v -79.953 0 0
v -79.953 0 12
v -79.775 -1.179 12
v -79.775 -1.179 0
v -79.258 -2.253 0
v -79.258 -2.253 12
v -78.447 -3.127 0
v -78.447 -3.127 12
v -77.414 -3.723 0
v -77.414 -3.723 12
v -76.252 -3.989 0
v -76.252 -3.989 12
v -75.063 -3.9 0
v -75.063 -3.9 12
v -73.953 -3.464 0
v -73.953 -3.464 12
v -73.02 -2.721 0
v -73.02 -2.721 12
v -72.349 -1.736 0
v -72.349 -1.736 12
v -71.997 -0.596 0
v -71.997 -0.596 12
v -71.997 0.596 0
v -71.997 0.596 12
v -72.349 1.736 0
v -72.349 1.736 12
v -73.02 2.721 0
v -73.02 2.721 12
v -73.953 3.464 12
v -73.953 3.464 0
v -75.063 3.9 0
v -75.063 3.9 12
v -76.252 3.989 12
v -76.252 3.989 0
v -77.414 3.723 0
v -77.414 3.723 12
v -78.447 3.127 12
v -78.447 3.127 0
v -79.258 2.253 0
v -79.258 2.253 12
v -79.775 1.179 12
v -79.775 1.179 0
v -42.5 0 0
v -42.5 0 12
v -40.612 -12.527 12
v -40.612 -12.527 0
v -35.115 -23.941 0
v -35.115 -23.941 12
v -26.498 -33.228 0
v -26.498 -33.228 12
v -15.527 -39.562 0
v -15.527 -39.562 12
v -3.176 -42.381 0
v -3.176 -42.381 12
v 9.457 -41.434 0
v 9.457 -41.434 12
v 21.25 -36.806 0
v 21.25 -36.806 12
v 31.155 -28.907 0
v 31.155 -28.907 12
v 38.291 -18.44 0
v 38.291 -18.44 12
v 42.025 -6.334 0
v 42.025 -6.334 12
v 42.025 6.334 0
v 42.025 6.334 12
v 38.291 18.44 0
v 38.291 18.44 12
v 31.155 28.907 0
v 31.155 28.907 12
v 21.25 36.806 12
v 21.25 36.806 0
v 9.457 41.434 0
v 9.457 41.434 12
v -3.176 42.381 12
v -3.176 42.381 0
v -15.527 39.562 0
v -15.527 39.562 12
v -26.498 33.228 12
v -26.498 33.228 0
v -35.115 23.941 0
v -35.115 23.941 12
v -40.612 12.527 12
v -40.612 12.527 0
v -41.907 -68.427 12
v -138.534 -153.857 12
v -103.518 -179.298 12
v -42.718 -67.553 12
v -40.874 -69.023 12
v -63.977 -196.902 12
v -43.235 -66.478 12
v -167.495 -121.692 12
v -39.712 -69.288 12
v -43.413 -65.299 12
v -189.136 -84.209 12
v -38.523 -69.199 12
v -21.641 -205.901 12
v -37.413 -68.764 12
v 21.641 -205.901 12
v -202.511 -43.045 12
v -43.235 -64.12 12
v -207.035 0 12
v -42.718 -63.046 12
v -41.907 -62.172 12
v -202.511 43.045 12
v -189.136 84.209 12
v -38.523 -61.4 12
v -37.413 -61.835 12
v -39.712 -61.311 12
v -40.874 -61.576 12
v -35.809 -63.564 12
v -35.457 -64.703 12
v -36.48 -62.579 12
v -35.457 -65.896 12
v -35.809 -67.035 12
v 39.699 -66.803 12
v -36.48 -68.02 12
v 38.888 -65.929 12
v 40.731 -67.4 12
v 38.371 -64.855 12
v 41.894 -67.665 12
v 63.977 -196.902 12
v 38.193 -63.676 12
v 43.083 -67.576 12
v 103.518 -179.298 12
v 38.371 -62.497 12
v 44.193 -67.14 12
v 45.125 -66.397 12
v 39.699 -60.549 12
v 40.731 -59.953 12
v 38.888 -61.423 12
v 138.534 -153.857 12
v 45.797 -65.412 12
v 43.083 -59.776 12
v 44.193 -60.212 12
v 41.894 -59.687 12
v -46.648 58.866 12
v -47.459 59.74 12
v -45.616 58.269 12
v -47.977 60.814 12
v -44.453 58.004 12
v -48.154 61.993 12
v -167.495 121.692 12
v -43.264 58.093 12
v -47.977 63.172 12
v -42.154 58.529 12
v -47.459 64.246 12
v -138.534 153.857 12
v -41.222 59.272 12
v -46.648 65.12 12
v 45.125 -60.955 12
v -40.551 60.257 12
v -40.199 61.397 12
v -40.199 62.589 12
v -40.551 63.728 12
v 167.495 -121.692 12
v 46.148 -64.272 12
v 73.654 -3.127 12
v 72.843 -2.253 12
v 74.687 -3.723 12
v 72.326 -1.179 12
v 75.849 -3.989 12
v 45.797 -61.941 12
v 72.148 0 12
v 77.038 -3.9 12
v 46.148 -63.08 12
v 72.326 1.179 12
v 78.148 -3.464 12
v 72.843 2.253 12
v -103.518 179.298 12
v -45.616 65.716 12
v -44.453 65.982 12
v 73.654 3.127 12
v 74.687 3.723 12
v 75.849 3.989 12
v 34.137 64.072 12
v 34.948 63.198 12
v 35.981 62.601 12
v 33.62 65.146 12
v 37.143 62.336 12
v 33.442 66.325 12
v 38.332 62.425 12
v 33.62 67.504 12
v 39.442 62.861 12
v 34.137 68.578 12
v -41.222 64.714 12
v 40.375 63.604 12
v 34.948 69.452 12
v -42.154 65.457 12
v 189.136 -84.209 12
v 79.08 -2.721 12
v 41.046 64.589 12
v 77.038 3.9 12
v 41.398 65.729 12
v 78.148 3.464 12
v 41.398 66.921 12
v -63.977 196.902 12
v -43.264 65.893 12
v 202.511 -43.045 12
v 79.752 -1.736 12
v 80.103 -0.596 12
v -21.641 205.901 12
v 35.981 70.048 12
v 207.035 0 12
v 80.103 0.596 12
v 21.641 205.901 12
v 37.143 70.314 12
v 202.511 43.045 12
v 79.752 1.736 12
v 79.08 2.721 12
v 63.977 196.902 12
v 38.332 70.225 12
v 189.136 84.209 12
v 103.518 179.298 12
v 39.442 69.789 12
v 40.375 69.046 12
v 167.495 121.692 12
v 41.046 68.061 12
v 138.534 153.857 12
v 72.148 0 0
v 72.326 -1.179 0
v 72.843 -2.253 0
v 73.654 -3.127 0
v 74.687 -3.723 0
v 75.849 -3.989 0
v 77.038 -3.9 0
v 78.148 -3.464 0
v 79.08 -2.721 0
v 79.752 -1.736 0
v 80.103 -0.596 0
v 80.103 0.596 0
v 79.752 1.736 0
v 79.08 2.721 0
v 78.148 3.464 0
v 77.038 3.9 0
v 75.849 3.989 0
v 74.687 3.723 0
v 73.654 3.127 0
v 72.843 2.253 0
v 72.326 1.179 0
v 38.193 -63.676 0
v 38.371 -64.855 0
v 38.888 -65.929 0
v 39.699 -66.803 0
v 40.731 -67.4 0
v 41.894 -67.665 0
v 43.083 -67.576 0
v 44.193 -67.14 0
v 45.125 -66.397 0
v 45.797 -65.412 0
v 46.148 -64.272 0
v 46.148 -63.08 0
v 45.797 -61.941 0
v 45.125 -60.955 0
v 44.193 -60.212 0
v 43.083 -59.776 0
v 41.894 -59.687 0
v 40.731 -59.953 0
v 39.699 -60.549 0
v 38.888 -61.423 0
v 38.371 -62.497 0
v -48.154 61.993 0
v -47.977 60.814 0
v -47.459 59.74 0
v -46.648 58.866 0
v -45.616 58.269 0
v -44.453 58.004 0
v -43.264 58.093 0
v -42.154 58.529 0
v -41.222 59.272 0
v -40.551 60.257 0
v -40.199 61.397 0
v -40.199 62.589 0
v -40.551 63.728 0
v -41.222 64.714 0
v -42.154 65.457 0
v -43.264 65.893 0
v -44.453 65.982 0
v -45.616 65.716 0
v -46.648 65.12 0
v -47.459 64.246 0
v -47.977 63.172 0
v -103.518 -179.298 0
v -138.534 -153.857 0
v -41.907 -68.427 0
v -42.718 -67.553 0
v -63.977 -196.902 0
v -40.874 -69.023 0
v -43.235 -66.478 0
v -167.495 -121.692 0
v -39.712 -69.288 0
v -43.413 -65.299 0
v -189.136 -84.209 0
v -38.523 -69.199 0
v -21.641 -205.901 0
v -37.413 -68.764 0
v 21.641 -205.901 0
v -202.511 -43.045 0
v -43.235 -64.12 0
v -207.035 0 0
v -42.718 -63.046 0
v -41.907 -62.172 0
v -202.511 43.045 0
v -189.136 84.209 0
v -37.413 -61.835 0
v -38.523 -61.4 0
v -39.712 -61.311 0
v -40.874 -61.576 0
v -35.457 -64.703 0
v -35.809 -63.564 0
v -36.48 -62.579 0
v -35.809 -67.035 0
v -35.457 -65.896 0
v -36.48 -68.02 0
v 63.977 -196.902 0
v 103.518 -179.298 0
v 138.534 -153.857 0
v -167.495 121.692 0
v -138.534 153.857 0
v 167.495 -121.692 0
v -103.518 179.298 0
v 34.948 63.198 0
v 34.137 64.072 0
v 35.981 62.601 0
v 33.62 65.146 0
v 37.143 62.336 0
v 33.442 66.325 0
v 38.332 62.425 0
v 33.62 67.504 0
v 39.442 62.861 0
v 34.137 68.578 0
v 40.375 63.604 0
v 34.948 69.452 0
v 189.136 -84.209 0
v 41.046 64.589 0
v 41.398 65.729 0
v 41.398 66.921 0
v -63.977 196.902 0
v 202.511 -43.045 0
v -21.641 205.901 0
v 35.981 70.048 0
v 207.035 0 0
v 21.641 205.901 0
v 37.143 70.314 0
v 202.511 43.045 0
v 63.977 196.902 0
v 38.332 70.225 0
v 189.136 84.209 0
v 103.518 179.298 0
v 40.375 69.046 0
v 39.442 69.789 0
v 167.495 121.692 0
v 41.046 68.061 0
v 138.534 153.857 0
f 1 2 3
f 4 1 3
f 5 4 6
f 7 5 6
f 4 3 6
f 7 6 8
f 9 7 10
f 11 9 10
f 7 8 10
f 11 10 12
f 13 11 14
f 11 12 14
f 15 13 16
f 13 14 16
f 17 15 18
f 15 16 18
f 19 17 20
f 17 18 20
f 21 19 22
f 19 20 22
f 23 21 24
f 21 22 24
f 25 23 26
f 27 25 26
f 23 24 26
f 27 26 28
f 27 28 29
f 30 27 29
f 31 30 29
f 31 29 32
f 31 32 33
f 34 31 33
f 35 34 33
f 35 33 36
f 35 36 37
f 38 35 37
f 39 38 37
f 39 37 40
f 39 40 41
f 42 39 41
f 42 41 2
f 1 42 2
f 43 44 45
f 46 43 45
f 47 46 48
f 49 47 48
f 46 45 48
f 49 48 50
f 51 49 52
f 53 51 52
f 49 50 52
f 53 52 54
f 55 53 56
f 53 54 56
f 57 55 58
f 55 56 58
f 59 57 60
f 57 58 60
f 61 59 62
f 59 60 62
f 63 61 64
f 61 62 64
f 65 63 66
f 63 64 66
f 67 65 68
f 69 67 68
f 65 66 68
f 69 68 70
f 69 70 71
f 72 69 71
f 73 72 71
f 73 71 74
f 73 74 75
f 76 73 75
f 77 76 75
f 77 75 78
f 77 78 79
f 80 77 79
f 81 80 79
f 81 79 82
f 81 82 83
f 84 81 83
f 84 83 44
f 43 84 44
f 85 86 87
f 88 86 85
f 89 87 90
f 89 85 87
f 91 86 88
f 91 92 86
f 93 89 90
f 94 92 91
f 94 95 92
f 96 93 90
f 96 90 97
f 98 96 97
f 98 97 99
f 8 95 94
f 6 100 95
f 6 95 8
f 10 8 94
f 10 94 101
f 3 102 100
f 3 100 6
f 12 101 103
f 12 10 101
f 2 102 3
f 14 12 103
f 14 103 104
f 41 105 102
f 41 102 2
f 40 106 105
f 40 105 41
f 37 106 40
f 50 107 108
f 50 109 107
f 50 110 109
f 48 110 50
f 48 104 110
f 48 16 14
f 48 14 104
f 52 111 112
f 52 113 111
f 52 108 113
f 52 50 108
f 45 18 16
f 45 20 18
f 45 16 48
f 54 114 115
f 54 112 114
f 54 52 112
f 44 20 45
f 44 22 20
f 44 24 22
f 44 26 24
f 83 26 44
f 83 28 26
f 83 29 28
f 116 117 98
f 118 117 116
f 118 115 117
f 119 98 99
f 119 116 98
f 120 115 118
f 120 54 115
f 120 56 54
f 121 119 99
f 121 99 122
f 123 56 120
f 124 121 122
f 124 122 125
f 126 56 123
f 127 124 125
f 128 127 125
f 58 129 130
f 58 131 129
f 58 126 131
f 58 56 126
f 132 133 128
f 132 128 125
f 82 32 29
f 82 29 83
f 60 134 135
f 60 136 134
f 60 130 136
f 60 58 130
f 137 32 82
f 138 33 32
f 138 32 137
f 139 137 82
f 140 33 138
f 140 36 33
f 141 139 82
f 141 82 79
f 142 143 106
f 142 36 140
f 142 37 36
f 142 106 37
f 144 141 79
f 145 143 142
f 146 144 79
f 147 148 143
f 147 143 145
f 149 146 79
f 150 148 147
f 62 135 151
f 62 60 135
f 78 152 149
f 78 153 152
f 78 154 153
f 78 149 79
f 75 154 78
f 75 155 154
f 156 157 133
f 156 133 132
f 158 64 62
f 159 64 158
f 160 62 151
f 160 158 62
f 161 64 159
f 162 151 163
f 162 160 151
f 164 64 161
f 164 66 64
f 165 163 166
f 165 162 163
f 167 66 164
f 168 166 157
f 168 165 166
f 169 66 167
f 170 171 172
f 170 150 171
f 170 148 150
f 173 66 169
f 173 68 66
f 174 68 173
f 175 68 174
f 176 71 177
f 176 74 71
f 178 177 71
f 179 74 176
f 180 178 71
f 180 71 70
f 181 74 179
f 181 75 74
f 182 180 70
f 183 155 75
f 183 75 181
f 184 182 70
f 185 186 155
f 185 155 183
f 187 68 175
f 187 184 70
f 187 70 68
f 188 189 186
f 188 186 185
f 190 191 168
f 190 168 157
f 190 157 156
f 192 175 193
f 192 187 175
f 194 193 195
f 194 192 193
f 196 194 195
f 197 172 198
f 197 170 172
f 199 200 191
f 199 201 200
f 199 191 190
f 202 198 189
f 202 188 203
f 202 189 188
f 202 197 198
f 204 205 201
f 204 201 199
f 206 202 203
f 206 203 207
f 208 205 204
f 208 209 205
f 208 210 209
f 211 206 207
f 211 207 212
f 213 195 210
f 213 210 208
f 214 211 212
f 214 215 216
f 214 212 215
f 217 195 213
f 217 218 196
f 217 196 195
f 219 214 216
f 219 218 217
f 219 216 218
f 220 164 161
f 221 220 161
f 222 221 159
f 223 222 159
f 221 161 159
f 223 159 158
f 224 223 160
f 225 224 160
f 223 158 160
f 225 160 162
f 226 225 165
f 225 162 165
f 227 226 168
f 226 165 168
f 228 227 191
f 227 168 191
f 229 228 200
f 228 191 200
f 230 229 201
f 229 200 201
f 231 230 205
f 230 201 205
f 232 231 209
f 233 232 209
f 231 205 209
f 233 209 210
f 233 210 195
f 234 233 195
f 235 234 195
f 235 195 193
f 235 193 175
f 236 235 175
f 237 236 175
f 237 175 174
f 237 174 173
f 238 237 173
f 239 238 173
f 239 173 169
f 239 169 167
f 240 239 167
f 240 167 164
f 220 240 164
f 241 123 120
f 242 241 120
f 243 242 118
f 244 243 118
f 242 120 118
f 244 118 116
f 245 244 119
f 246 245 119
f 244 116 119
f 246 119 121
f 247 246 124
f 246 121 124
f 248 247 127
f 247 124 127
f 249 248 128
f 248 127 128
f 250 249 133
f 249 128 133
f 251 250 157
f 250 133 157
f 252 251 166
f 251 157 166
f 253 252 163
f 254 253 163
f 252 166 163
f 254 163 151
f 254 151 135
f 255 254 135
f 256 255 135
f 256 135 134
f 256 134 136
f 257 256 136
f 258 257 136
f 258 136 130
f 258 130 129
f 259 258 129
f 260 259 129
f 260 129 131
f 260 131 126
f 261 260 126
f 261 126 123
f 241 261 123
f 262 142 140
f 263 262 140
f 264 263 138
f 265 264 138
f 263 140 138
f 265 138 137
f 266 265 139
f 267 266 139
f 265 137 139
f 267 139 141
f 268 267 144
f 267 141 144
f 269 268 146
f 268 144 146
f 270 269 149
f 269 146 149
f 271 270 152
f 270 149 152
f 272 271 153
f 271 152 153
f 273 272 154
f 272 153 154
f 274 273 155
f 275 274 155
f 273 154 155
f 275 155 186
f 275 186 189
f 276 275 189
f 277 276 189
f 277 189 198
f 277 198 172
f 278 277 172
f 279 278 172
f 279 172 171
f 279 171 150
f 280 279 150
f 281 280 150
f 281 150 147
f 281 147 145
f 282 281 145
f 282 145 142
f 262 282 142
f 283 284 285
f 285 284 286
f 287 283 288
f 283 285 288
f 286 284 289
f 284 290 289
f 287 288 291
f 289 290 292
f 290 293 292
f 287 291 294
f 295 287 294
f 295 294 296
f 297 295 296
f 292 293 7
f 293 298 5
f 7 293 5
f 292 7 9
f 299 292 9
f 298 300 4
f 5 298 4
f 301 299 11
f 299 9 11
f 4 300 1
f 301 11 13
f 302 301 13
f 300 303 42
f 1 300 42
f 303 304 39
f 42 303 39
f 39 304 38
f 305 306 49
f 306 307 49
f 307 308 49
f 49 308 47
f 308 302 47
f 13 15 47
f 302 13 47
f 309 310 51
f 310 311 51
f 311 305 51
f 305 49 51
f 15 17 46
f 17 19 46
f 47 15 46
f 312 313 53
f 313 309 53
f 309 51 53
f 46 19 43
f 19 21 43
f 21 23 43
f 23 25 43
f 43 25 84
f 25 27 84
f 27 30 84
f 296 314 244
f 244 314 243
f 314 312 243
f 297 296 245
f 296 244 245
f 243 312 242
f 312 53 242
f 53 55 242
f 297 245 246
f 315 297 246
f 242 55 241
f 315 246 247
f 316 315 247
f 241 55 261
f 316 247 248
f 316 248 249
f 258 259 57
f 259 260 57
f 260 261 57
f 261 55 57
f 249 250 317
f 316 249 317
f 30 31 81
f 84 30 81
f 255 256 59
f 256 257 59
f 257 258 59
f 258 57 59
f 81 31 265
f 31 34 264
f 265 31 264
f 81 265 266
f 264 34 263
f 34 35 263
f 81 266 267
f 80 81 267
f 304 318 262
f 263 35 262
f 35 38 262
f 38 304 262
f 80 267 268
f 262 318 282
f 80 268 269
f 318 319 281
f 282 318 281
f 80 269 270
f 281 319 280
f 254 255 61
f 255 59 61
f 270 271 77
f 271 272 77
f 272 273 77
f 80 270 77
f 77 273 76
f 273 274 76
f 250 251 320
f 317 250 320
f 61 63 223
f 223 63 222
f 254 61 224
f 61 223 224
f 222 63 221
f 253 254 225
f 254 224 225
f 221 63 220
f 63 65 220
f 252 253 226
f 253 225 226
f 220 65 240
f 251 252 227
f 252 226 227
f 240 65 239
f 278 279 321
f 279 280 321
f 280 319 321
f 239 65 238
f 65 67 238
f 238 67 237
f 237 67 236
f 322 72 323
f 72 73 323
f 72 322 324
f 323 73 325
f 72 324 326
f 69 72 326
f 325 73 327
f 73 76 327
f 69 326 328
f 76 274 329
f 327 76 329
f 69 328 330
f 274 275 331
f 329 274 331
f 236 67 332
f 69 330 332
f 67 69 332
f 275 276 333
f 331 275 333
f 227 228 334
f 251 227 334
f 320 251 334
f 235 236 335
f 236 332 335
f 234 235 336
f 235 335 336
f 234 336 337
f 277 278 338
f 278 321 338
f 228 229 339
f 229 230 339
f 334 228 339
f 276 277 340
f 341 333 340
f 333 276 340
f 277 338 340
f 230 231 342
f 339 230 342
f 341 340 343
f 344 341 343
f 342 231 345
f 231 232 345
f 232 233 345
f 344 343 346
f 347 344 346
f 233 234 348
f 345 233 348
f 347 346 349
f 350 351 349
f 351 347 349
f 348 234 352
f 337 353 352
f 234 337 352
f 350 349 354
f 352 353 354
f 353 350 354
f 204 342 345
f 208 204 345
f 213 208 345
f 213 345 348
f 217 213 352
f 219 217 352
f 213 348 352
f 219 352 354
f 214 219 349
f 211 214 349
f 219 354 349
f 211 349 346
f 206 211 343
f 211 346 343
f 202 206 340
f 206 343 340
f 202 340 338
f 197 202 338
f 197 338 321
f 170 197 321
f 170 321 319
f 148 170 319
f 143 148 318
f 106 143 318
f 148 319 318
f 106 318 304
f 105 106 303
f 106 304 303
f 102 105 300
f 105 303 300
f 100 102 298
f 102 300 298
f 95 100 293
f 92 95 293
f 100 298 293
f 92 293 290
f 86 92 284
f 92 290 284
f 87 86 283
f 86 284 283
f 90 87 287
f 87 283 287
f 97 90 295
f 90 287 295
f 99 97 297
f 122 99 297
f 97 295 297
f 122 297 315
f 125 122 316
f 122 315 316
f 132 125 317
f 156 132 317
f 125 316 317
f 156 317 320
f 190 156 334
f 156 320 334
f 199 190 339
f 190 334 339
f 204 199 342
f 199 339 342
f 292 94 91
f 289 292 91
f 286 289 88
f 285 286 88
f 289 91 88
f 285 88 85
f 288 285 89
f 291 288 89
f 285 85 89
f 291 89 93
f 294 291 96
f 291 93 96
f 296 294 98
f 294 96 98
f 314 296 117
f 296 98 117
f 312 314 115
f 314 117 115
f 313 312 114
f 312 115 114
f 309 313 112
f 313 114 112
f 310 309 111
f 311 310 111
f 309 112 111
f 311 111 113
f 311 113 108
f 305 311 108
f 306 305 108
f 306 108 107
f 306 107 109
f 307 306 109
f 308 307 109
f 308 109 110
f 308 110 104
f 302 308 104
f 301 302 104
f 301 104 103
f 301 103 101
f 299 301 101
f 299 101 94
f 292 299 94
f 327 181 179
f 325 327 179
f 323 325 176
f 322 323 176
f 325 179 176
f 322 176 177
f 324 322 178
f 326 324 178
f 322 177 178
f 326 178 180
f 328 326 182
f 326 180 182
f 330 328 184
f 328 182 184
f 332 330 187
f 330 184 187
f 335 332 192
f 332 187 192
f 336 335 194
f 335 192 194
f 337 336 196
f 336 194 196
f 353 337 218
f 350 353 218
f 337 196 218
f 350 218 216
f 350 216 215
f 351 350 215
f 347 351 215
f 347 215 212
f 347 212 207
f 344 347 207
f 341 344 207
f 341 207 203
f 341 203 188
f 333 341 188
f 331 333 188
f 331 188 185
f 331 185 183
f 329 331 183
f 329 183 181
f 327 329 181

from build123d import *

# Parameters (mm, degrees)
F0_R     = 207.035433
F1_DEPTH = 12
F3_D     = 85
F6_D     = 8


with BuildPart() as f1:
    # F0 (on Top) → F1 (new body)
    with BuildSketch(Plane.XY):
        Circle(F0_R)
    extrude(amount=F1_DEPTH)

    # F3 (through all)
    with Locations(Plane(origin=(0, 0, 0), x_dir=(1, 0, 0), z_dir=(0, 0, -1))):
        with Locations((0, 0)):
            Hole(F3_D / 2)

    # F6 (through all)
    with Locations(Plane(origin=(0, 0, 0), x_dir=(1, 0, 0), z_dir=(0, 0, -1))):
        with Locations((-75.952627, 0), (-39.412599, 65.299459), (42.192809, 63.676074), (76.147959, 0), (37.442353, -66.324979), (-44.154473, -61.992928)):
            Hole(F6_D / 2)


solid = f1.part
